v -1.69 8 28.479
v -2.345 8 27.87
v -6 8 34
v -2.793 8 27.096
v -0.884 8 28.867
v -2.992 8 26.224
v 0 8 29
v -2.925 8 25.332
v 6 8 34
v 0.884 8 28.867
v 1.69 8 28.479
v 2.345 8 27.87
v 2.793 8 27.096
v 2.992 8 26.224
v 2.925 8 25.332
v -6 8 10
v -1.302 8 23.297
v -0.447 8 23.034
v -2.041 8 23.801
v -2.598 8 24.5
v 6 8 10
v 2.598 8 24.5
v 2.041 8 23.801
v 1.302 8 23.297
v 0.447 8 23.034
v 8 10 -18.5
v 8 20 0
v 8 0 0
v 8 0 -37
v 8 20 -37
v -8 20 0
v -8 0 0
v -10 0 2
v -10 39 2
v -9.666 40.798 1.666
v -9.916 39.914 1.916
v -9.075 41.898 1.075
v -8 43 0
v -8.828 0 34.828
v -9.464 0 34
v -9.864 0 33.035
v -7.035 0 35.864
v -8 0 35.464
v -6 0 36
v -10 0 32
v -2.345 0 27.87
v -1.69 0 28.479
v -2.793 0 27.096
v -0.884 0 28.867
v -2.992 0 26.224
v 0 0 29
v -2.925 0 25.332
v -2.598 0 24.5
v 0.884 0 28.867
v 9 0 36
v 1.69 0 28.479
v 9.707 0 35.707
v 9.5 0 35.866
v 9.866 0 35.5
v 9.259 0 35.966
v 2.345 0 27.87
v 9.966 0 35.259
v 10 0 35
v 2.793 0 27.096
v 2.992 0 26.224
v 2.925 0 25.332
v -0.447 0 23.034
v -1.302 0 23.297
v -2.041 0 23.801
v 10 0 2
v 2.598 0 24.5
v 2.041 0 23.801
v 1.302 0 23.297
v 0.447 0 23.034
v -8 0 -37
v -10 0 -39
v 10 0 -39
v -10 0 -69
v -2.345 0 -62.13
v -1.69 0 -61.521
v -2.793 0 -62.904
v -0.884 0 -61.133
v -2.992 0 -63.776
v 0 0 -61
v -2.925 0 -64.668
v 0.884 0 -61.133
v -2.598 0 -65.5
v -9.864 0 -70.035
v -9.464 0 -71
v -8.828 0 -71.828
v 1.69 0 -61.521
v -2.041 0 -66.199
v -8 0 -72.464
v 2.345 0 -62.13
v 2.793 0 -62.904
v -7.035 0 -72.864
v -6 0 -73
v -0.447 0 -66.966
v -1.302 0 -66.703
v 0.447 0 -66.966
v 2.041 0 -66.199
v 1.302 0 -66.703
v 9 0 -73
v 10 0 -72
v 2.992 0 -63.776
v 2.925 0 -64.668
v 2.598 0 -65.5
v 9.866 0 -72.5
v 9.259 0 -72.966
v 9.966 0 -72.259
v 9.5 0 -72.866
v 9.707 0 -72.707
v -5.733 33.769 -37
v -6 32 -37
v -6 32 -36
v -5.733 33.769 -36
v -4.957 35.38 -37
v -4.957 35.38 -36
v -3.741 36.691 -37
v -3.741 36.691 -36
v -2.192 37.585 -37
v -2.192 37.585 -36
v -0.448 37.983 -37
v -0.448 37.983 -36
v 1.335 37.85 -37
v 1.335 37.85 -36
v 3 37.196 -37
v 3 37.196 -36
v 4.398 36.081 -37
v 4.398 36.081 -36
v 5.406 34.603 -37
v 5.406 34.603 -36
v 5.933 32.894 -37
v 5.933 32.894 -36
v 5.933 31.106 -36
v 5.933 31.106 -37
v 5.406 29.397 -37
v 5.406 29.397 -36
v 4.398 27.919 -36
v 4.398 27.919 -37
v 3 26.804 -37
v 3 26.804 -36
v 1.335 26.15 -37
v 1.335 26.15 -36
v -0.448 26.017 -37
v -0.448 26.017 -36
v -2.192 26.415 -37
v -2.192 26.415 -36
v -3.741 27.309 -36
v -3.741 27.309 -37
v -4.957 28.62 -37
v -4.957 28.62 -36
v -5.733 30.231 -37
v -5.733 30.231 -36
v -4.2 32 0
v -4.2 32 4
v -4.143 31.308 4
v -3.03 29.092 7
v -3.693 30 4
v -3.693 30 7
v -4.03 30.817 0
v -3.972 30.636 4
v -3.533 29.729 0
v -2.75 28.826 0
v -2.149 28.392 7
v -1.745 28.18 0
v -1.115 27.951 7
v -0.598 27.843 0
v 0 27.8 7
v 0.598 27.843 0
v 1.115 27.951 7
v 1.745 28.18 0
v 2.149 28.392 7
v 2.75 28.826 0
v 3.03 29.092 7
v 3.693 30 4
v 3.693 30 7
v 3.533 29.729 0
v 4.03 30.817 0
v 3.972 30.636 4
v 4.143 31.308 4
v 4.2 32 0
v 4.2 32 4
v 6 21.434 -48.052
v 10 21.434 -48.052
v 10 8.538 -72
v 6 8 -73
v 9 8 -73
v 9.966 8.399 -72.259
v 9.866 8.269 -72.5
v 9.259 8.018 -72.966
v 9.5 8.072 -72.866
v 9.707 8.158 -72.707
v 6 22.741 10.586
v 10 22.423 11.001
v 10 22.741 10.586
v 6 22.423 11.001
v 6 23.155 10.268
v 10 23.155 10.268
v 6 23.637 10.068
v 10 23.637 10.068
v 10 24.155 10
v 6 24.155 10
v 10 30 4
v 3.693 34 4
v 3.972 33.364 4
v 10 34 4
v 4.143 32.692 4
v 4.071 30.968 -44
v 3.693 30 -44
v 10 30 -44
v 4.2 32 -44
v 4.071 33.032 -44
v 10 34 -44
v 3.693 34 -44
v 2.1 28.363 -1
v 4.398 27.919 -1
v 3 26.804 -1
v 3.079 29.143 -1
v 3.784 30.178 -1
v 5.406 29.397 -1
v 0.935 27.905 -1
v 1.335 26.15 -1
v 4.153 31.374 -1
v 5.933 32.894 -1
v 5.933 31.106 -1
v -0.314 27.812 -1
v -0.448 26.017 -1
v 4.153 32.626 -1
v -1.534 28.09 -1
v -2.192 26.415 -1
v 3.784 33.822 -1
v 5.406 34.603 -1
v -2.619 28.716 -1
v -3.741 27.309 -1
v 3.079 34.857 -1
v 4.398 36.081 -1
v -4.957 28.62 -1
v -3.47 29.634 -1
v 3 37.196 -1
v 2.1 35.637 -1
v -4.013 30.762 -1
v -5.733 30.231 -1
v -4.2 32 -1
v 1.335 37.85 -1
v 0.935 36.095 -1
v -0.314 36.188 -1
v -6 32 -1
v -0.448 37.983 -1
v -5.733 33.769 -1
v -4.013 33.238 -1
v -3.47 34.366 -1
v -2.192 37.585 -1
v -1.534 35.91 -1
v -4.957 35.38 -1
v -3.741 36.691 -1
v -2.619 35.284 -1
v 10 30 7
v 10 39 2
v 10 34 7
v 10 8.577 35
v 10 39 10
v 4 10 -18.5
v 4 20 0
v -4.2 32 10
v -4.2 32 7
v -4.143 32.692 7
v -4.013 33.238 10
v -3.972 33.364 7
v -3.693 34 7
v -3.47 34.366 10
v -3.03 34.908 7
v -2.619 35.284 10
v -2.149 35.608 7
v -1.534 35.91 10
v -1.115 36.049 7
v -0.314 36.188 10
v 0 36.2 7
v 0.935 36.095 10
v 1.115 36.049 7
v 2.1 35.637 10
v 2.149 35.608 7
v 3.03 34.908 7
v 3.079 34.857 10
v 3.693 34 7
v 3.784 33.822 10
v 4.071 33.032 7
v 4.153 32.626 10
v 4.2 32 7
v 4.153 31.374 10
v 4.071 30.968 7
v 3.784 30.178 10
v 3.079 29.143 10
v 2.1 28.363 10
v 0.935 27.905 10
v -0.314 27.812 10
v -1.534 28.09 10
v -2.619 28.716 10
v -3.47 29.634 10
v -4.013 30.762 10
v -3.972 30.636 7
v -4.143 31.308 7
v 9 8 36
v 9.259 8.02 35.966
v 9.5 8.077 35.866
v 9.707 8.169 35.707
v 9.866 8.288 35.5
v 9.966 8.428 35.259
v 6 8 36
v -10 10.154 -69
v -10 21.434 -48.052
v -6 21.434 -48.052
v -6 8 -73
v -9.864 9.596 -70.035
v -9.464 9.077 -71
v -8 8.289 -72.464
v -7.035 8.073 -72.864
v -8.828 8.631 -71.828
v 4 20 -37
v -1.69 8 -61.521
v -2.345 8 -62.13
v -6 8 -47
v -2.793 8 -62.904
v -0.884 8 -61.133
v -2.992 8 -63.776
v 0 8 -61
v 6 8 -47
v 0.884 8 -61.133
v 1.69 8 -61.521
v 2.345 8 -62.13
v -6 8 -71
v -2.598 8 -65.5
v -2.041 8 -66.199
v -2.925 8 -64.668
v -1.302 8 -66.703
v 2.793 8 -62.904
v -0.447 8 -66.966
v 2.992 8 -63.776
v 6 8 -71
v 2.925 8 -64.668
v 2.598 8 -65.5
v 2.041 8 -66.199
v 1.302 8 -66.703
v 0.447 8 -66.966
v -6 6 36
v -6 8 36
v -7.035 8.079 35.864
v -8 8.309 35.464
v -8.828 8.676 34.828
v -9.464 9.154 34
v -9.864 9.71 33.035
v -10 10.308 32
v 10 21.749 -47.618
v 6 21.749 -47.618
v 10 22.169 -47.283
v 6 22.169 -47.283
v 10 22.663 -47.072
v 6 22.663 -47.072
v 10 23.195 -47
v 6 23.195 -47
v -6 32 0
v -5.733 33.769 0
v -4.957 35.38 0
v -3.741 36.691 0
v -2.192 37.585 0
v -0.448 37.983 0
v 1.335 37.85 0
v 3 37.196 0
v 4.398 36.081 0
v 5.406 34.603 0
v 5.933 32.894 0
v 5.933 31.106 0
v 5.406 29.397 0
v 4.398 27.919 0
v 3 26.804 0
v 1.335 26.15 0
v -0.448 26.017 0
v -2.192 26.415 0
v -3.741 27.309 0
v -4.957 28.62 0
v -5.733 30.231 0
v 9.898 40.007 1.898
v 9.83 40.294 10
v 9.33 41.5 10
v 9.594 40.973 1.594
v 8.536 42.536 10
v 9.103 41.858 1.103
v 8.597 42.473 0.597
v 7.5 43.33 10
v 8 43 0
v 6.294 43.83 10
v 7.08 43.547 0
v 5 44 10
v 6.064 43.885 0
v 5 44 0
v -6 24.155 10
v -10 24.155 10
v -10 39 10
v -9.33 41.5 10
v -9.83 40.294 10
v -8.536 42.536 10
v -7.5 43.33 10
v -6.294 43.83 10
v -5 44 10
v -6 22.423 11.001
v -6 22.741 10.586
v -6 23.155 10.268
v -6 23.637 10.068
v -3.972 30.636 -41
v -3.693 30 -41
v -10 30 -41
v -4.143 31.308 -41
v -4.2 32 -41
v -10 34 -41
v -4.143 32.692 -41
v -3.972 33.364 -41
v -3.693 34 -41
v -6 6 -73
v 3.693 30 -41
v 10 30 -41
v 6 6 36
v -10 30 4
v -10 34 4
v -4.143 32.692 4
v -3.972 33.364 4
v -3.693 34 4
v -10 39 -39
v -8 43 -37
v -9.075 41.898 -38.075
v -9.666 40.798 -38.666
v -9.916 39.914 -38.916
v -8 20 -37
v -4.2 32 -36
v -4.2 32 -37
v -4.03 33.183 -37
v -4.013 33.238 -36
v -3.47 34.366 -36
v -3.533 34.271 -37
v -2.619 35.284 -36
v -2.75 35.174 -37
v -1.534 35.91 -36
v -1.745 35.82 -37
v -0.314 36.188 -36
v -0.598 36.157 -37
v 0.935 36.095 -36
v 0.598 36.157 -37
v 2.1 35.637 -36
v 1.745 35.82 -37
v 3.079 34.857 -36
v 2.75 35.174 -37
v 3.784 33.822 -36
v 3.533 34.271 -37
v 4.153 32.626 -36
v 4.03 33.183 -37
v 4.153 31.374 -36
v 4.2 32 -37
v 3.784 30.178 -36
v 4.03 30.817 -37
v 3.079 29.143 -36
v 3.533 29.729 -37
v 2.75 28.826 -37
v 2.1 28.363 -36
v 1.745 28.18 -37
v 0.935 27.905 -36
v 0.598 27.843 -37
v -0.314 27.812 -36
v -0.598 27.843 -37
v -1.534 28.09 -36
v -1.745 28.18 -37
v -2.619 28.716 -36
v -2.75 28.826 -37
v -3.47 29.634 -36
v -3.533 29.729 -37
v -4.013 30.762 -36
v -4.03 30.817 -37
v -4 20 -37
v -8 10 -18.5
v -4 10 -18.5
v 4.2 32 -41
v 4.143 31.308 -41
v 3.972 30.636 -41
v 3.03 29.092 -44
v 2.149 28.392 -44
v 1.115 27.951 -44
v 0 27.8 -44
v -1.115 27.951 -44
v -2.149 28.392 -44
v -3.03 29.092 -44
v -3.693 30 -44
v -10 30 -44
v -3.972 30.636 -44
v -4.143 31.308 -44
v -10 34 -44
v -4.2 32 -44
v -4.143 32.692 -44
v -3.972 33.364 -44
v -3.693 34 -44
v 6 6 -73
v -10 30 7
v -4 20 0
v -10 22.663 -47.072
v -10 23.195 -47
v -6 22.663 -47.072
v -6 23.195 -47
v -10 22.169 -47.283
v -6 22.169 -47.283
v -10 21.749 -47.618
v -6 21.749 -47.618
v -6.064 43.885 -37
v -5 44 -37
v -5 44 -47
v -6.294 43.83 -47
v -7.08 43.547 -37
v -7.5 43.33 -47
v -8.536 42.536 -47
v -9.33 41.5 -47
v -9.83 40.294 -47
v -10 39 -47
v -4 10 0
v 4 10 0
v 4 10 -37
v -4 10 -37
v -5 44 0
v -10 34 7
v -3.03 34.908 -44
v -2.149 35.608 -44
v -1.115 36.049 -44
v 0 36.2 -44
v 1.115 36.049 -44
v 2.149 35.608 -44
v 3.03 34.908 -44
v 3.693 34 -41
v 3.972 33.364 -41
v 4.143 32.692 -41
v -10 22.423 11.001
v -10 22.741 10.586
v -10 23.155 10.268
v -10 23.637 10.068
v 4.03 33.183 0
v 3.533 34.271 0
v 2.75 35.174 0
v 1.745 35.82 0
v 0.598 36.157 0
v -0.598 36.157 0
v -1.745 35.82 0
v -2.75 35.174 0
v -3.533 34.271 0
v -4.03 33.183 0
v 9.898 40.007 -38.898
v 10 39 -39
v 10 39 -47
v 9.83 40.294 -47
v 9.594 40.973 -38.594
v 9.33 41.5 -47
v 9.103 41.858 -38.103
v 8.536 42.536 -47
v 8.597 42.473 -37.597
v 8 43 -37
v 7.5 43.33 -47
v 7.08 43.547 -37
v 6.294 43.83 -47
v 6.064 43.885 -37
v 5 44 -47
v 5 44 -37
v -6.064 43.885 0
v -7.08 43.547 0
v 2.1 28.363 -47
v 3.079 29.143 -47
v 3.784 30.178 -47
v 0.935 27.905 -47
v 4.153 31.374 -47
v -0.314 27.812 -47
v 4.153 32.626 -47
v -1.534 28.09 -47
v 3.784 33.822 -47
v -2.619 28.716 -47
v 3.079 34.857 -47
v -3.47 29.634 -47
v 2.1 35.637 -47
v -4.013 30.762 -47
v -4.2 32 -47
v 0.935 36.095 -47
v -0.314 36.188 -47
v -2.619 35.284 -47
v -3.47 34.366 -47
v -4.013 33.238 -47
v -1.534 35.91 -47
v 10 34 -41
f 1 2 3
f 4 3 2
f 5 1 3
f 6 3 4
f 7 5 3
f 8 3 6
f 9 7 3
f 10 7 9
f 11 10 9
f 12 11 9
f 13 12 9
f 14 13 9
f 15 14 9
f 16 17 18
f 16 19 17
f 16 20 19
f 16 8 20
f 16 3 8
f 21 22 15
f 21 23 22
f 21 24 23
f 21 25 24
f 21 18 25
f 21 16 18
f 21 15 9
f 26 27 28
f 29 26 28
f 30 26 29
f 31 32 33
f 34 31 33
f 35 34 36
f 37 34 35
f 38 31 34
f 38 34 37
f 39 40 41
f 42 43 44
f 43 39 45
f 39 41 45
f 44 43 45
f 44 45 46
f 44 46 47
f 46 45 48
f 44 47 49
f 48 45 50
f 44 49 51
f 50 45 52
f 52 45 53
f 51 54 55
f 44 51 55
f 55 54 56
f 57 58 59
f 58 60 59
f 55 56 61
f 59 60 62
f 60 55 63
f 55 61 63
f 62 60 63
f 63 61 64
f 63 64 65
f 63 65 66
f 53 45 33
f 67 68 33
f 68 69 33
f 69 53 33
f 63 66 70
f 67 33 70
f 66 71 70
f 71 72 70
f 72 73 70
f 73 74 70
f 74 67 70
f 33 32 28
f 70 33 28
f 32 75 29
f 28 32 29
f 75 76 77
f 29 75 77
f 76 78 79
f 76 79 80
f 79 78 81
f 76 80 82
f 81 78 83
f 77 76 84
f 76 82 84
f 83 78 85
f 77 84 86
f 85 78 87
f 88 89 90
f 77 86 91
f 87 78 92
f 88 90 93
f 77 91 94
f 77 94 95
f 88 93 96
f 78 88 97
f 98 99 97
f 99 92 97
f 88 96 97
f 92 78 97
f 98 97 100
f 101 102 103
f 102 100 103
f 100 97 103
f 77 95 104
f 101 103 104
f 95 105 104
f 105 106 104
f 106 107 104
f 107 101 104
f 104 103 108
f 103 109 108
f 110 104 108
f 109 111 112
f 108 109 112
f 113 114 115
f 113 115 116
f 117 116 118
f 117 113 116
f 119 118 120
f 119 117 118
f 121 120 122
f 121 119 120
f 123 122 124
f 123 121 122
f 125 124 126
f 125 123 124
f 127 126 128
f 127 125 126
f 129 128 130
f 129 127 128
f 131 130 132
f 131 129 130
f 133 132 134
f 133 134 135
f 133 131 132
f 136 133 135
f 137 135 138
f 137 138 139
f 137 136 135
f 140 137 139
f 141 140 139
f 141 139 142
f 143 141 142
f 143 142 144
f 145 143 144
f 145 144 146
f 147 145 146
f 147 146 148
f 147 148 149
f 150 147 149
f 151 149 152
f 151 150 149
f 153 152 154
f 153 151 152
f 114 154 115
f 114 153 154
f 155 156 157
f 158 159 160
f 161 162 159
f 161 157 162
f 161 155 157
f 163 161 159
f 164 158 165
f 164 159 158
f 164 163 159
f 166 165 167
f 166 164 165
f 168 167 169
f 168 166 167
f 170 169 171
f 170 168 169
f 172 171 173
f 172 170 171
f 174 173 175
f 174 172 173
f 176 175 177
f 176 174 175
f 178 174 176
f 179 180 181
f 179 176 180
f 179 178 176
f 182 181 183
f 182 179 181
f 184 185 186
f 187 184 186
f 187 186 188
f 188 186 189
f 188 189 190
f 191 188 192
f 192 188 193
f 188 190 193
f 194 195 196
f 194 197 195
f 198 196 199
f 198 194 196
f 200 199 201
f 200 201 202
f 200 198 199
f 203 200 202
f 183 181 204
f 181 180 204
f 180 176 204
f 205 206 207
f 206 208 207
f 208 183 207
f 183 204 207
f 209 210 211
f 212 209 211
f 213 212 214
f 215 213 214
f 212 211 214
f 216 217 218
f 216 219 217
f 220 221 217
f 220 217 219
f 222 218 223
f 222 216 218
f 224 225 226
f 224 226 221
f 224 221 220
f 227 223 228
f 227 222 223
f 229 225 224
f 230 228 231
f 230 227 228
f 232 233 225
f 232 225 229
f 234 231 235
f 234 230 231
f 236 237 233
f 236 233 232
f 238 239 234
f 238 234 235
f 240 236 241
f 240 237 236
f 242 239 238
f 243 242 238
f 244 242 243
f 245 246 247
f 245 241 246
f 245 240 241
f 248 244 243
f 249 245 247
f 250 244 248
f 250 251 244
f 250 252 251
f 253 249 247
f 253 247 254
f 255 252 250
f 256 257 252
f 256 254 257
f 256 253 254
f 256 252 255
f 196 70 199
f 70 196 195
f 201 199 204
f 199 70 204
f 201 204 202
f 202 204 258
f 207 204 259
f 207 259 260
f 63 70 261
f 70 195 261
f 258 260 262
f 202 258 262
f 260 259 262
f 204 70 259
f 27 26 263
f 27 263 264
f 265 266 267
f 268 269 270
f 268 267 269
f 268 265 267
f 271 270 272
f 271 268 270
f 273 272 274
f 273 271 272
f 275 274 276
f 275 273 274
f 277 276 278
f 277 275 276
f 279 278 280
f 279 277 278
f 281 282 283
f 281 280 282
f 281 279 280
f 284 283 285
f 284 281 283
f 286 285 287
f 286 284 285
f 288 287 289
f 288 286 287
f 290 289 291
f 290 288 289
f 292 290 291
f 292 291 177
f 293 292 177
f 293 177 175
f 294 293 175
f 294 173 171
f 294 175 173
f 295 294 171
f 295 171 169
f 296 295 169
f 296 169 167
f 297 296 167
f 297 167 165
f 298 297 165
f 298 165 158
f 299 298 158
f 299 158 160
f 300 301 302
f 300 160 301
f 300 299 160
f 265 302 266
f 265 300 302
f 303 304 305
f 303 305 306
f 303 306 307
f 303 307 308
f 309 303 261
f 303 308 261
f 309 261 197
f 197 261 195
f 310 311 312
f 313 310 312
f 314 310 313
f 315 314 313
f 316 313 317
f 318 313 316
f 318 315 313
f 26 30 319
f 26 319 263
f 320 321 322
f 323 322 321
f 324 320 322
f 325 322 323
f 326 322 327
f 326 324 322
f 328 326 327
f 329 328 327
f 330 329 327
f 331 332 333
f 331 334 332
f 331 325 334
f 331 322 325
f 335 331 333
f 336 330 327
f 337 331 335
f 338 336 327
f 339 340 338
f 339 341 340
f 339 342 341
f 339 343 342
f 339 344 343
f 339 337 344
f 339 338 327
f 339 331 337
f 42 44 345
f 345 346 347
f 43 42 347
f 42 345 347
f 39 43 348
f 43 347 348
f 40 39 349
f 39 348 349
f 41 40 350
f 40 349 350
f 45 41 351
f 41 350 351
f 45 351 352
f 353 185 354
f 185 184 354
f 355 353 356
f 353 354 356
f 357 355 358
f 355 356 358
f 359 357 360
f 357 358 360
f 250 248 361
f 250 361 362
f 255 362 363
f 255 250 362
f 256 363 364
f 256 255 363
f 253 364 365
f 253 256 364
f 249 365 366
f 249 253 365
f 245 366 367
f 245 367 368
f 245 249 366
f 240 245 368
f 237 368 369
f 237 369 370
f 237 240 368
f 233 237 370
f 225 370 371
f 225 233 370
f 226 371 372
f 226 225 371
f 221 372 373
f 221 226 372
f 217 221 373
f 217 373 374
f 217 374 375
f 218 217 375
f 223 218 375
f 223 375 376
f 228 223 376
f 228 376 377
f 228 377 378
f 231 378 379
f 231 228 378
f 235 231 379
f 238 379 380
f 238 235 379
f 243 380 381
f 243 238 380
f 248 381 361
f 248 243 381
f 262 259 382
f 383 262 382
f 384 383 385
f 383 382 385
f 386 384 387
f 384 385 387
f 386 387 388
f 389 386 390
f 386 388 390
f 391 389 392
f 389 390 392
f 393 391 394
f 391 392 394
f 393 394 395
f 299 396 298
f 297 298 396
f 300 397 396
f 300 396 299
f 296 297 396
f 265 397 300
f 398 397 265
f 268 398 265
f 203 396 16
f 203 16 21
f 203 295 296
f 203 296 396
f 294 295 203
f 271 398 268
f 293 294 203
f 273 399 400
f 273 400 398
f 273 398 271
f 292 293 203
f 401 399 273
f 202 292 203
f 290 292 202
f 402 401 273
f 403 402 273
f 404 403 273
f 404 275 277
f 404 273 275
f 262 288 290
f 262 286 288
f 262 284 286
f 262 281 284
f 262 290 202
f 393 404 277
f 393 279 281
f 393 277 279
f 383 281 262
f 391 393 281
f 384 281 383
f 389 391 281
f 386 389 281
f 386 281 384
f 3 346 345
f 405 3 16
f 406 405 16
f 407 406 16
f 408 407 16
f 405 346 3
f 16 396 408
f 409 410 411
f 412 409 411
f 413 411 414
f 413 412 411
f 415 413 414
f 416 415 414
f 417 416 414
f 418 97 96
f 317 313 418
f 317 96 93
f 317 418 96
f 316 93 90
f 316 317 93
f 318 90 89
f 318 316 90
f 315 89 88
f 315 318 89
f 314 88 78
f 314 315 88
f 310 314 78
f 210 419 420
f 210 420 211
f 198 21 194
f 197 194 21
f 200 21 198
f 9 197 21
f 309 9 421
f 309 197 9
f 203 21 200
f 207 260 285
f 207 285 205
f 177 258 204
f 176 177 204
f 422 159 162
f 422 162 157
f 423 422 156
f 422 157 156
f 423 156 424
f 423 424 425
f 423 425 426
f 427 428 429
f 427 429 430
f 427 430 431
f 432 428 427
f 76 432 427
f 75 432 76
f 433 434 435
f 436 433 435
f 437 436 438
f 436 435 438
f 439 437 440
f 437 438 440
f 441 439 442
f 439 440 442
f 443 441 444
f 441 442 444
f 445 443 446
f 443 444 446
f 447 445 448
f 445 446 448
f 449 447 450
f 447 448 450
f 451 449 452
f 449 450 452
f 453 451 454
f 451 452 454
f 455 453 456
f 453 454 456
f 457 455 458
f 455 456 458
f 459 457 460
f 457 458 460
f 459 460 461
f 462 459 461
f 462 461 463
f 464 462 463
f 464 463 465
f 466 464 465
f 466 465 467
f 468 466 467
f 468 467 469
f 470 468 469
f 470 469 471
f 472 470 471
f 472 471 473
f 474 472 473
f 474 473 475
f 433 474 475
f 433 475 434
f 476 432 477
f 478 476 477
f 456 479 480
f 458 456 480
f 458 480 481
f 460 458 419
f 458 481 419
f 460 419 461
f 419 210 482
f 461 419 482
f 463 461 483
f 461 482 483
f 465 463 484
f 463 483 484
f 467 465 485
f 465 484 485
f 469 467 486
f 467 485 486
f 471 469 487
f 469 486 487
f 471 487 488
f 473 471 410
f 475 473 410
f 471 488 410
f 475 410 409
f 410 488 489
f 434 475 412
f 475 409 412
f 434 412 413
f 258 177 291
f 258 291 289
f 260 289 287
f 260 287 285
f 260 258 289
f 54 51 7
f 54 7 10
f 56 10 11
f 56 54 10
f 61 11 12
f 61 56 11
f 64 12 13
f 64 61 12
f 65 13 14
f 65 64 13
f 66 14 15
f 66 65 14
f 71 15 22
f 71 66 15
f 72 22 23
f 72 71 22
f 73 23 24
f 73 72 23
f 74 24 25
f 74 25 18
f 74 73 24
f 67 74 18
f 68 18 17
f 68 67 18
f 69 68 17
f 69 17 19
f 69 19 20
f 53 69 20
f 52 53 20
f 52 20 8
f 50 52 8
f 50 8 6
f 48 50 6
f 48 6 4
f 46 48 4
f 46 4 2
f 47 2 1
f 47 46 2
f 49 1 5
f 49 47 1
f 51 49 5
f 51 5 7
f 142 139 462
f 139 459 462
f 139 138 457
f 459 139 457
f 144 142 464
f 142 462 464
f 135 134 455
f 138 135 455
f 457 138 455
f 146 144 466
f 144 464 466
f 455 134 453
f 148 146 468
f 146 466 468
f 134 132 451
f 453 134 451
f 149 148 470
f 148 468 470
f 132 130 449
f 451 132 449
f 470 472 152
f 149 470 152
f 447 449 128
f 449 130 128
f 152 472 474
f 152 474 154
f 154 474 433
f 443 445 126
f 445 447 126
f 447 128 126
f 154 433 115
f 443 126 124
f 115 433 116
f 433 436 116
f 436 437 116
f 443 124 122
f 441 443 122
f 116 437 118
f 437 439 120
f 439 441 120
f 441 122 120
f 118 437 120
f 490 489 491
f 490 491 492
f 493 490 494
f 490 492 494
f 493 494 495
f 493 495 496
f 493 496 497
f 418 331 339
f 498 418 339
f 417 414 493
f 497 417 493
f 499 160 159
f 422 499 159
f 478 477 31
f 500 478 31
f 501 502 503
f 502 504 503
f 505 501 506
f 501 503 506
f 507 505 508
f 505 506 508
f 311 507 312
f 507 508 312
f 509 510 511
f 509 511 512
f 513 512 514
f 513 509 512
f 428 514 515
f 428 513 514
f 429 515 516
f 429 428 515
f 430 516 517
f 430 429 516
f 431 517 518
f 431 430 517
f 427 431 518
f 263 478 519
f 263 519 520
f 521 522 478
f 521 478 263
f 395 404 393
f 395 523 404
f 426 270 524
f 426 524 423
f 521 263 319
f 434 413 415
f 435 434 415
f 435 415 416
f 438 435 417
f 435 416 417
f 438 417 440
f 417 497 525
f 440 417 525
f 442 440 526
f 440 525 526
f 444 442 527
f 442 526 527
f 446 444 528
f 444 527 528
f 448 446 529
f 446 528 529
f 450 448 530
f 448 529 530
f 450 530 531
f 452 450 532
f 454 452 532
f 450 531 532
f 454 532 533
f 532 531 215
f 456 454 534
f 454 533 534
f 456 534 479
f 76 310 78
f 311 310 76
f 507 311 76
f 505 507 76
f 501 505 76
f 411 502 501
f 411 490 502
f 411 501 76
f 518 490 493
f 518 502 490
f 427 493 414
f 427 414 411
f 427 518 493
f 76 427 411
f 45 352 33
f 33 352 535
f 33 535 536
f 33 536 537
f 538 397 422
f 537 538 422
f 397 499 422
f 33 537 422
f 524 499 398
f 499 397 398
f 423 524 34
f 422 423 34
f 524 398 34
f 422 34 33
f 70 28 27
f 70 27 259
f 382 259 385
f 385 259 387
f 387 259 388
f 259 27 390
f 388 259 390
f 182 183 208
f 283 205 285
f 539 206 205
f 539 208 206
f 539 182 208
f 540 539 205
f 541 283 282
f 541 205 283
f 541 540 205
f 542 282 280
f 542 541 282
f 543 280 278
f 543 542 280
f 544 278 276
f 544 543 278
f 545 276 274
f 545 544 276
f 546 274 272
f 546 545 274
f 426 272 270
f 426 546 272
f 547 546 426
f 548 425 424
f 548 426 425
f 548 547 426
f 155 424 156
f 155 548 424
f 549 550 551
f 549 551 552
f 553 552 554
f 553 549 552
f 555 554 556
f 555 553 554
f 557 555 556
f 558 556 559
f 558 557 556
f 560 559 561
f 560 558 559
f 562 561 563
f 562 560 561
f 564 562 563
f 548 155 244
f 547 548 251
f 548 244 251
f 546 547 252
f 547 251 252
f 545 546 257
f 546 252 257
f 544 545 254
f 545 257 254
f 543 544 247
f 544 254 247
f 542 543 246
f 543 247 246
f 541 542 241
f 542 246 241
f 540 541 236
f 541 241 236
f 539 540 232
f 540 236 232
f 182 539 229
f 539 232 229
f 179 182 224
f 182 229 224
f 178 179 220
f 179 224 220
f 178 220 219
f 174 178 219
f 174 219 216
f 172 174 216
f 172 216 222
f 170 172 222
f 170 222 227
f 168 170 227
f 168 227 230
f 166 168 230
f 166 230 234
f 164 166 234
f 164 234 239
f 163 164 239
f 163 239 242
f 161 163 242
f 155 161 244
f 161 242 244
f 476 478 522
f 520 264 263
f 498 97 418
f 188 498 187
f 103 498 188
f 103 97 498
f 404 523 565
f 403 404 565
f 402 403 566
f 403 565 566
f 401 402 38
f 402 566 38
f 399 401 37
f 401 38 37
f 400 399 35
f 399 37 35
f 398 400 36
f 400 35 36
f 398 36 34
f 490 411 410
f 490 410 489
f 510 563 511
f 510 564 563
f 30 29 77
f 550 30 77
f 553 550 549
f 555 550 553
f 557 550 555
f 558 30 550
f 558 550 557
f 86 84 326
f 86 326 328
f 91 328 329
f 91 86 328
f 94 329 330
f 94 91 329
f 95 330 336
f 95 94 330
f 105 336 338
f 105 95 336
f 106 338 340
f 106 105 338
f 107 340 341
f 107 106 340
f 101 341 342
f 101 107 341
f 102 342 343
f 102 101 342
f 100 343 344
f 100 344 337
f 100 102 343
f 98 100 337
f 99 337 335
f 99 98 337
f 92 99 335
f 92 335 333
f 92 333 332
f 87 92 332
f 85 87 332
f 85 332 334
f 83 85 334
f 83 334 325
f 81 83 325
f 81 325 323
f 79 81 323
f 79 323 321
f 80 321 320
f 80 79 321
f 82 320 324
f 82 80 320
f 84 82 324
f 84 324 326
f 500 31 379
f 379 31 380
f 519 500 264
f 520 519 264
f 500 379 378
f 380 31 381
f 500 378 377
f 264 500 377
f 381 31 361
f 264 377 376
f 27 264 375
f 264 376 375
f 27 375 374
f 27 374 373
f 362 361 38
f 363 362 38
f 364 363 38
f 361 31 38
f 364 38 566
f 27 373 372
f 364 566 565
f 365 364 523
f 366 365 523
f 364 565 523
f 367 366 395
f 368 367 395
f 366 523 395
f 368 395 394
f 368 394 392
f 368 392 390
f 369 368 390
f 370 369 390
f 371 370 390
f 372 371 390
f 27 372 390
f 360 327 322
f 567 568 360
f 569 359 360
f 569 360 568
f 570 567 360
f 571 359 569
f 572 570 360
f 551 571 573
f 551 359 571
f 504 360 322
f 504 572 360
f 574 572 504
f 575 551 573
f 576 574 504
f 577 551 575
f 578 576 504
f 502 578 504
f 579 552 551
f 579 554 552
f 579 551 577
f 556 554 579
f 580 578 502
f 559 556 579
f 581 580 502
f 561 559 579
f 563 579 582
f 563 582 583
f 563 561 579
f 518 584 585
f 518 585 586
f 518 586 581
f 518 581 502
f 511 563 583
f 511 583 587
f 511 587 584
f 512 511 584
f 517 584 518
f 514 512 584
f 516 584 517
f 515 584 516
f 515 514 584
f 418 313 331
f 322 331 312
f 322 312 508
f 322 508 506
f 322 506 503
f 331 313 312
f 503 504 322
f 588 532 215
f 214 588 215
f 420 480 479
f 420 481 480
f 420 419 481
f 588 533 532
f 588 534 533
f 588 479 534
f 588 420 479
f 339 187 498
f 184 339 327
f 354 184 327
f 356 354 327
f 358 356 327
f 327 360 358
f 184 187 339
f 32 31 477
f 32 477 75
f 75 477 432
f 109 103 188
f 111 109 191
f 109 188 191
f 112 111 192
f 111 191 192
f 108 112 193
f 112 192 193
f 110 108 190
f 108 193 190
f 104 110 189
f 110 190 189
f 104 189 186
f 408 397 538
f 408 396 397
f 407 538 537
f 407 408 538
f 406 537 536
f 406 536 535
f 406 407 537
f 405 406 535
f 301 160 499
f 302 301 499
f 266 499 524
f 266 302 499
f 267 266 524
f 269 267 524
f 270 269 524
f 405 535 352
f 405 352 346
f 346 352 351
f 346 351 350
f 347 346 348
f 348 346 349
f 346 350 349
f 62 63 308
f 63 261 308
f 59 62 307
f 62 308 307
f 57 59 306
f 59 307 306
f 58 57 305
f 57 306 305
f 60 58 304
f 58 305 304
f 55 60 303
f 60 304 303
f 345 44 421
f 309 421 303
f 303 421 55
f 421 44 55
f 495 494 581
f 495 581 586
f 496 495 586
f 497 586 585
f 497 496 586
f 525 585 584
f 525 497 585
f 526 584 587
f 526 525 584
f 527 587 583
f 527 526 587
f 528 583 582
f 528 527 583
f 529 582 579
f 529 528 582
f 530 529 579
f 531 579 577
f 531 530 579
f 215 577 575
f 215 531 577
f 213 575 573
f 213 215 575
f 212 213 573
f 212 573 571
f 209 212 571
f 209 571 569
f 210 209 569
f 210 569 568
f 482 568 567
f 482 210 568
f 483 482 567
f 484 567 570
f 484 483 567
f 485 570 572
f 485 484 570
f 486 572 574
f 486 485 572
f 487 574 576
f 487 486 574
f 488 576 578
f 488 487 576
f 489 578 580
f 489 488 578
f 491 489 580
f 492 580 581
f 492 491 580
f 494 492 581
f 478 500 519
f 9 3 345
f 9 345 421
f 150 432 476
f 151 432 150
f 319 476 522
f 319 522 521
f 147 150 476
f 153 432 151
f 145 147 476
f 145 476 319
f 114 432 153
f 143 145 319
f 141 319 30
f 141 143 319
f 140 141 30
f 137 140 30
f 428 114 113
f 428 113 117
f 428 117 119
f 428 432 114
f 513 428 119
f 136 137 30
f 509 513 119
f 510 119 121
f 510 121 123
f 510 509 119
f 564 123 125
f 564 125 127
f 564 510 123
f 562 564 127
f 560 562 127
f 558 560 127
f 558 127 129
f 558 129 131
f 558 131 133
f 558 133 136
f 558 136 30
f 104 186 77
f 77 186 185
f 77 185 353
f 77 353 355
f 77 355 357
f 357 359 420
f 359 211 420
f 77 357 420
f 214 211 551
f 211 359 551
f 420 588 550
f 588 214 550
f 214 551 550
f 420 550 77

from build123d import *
from build123d.topology import SkipClean

# Parameters (mm, degrees)
SKETCH_1_W               = 20
SKETCH_1_H               = 44
SKETCH_1_R               = 4.2
EXTRUDE_1_DEPTH          = 7
SKETCH_2_W               = 20
SKETCH_2_H               = 44
EXTRUDE_2_DEPTH          = 3
SKETCH_3_W               = 20
SKETCH_3_H               = 26
SKETCH_3_R               = 3
EXTRUDE_4_DEPTH          = 8
EXTRUDE_5_DEPTH          = 4
EXTRUDE_6_DEPTH          = 4
CHAMFER_1_SIZE           = 2
FILLET_2_R               = 5
FILLET_3_R               = 1
FILLET_4_R               = 2
SKETCH_6_W               = 16
SKETCH_6_H               = 37
EXTRUDE_7_DEPTH          = 10
EXTRUDE_START            = 7
SKETCH_7_R               = 4.2
EXTRUDE_8_DEPTH          = 7
CHAMFER_2_SIZE           = 2
SKETCH_8_W               = 20
SKETCH_8_H               = 44
EXTRUDE_9_DEPTH          = 3
SKETCH_9_W               = 20
SKETCH_9_H               = 26
SKETCH_9_R               = 3
EXTRUDE_10_DEPTH         = 8
EXTRUDE_11_DEPTH         = 4
EXTRUDE_12_DEPTH         = 4
FILLET_5_R               = 2
FILLET_7_R               = 1
FILLET_8_R               = 5
SKETCH_12_W              = 3
SKETCH_12_H              = 4
CUT_EXTRUDE_1_DEPTH      = 88.549985722
EXTRUDE_13_DEPTH         = 4
EXTRUDE_14_DEPTH         = 4
CUT_EXTRUDE_2_DEPTH      = 86.819578186
CUT_EXTRUDE_2_DEPTH_BACK = 86.819578186
SKETCH_15_R              = 4.2
SKETCH_16_R              = 6
SKETCH_16_R_2            = 4.2
EXTRUDE_15_DEPTH         = 1
EXTRUDE_START_2          = 1
SKETCH_17_R              = 6
SKETCH_17_R_2            = 4.2
EXTRUDE_16_DEPTH         = 1
CHAMFER_3_SIZE           = 2
FILLET_9_R               = 4


with BuildPart() as part:
    # Эскиз1 → Бобышка-Вытянуть1 (new body)
    with BuildSketch(Plane.XY):
        with Locations((0, 22)):
            Rectangle(SKETCH_1_W, SKETCH_1_H)
        with Locations((0, 32)):
            Circle(SKETCH_1_R, mode=Mode.SUBTRACT)
    extrude(amount=EXTRUDE_1_DEPTH)

    # Эскиз2 → Бобышка-Вытянуть2 (add)
    with BuildSketch(Plane.XY.offset(7)):
        with Locations((0, 22)):
            Rectangle(SKETCH_2_W, SKETCH_2_H)
    extrude(amount=EXTRUDE_2_DEPTH)

    # Эскиз3 → Бобышка-Вытянуть4 (add)
    with BuildSketch(Plane(origin=(0, 0, 0), x_dir=(1, 0, 0), z_dir=(0, 1, 0))):
        with Locations((0, -23)):
            Rectangle(SKETCH_3_W, SKETCH_3_H)
        with Locations(Location((0, -26, 0), (0, 0, 270))):
            Circle(SKETCH_3_R, mode=Mode.SUBTRACT)
    extrude(amount=EXTRUDE_4_DEPTH)

    # Эскиз4 → Бобышка-Вытянуть5 (add)
    with BuildSketch(Plane.ZY.offset(10)):
        Polygon((36, 8), (10, 8), (10, 23), align=None)
    extrude(amount=-EXTRUDE_5_DEPTH)

    # Эскиз5 → Бобышка-Вытянуть6 (add)
    with BuildSketch(Plane(origin=(10, 0, 0), x_dir=(0, 0, -1), z_dir=(1, 0, 0))):
        Polygon((-36, 8), (-10, 23), (-10, 8), align=None)
    extrude(amount=-EXTRUDE_6_DEPTH)

    # Фаска1
    chamfer_1_edges = [part.edges().sort_by_distance(p)[0] for p in [
        (10, 22, 0),
        (-10, 22, 0),
    ]]
    chamfer(chamfer_1_edges, length=CHAMFER_1_SIZE)

    # Скругление2
    fillet_2_edges = [part.edges().sort_by_distance(p)[0] for p in [
        (-10, 44, 6),
        (10, 44, 6),
    ]]
    fillet(fillet_2_edges, radius=FILLET_2_R)

    # Скругление3
    fillet_3_edges = [part.edges().sort_by_distance(p)[0] for p in [
        (10, 4, 36),
    ]]
    fillet(fillet_3_edges, radius=FILLET_3_R)

    # Скругление4
    fillet_4_edges = [part.edges().sort_by_distance(p)[0] for p in [
        (-8, 23, 10),
        (8, 23, 10),
    ]]
    fillet(fillet_4_edges, radius=FILLET_4_R)

    # Эскиз6 → Бобышка-Вытянуть7 (add)
    with BuildSketch(Plane(origin=(0, 0, 0), x_dir=(1, 0, 0), z_dir=(0, 1, 0))):
        with Locations((0, 18.5)):
            Rectangle(SKETCH_6_W, SKETCH_6_H)
    extrude(amount=EXTRUDE_7_DEPTH)

    # Эскиз7 → Бобышка-Вытянуть8 (add)
    with BuildSketch(Plane(origin=(0, 0, -37), x_dir=(-1, 0, 0), z_dir=(0, 0, -1)).offset(EXTRUDE_START)):
        Polygon((0, 0), (-10, 0), (-10, 44), (10, 44), (10, 0), align=None)
        with Locations(Location((0, 32, 0), (0, 0, 180))):
            Circle(SKETCH_7_R, mode=Mode.SUBTRACT)
    extrude(amount=-EXTRUDE_8_DEPTH)

    # Фаска2
    chamfer_2_edges = [part.edges().sort_by_distance(p)[0] for p in [
        (10, 22, -37),
        (-10, 22, -37),
    ]]
    chamfer(chamfer_2_edges, length=CHAMFER_2_SIZE)

    # Эскиз8 → Бобышка-Вытянуть9 (add)
    with BuildSketch(Plane(origin=(0, 0, -44), x_dir=(-1, 0, 0), z_dir=(0, 0, -1))):
        with Locations((0, 22)):
            Rectangle(SKETCH_8_W, SKETCH_8_H)
    extrude(amount=EXTRUDE_9_DEPTH)

    # Эскиз9 → Бобышка-Вытянуть10 (add)
    with BuildSketch(Plane(origin=(0, 0, 0), x_dir=(1, 0, 0), z_dir=(0, 1, 0))):
        with Locations((0, 60)):
            Rectangle(SKETCH_9_W, SKETCH_9_H)
        with Locations(Location((0, 64, 0), (0, 0, 270))):
            Circle(SKETCH_9_R, mode=Mode.SUBTRACT)
    extrude(amount=EXTRUDE_10_DEPTH)

    # Эскиз10 → Бобышка-Вытянуть11 (add)
    with BuildSketch(Plane.ZY.offset(10)):
        Polygon((-73, 8), (-47, 8), (-47, 22), align=None)
    extrude(amount=-EXTRUDE_11_DEPTH)

    # Эскиз11 → Бобышка-Вытянуть12 (add)
    with BuildSketch(Plane(origin=(10, 0, 0), x_dir=(0, 0, -1), z_dir=(1, 0, 0))):
        Polygon((47, 8), (47, 22), (73, 8), align=None)
    extrude(amount=-EXTRUDE_12_DEPTH)

    # Скругление5
    fillet_5_edges = [part.edges().sort_by_distance(p)[0] for p in [
        (-8, 22, -47),
        (8, 22, -47),
    ]]
    fillet(fillet_5_edges, radius=FILLET_5_R)

    # Скругление7
    fillet_7_edges = [part.edges().sort_by_distance(p)[0] for p in [
        (10, 4, -73),
    ]]
    fillet(fillet_7_edges, radius=FILLET_7_R)

    # Скругление8
    fillet_8_edges = [part.edges().sort_by_distance(p)[0] for p in [
        (-10, 44, -43),
        (10, 44, -43),
    ]]
    fillet(fillet_8_edges, radius=FILLET_8_R)

    # Эскиз12 → Вырез-Вытянуть1 (cut, through all)
    with BuildSketch(Plane(origin=(10, 0, 0), x_dir=(0, 0, -1), z_dir=(1, 0, 0))):
        with Locations((-5.5, 32)):
            Rectangle(SKETCH_12_W, SKETCH_12_H)
        with Locations((42.5, 32)):
            Rectangle(SKETCH_12_W, SKETCH_12_H)
    extrude(amount=-CUT_EXTRUDE_1_DEPTH, mode=Mode.SUBTRACT)

    # Эскиз13 → Бобышка-Вытянуть13 (add)
    with BuildSketch(Plane(origin=(8, 0, 0), x_dir=(0, 0, -1), z_dir=(1, 0, 0))):
        Polygon((0, 10), (18.5, 10), (0, 20), align=None)
        Polygon((37, 10), (37, 20), (18.5, 10), align=None)
    extrude(amount=-EXTRUDE_13_DEPTH)

    # Эскиз14 → Бобышка-Вытянуть14 (add)
    with BuildSketch(Plane.ZY.offset(8)):
        Polygon((0, 10), (-18.5, 10), (0, 20), align=None)
        Polygon((-37, 10), (-37, 20), (-18.5, 10), align=None)
    extrude(amount=-EXTRUDE_14_DEPTH)

    # Эскиз15 → Вырез-Вытянуть2 (cut, two sides: drawn at the far end of the back side and taken through both)
    with SkipClean():  # the faces are left unmerged after this step: merging them gives an invalid solid
        with BuildSketch(Plane(origin=(0, 0, -37), x_dir=(-1, 0, 0), z_dir=(0, 0, -1)).offset(-CUT_EXTRUDE_2_DEPTH_BACK)):
            with Locations((0, 32)):
                Circle(SKETCH_15_R)
        extrude(amount=CUT_EXTRUDE_2_DEPTH + CUT_EXTRUDE_2_DEPTH_BACK, mode=Mode.SUBTRACT)

    # Эскиз16 → Бобышка-Вытянуть15 (add)
    with SkipClean():  # the faces are left unmerged after this step: merging them gives an invalid solid
        with BuildSketch(Plane(origin=(0, 0, -37), x_dir=(-1, 0, 0), z_dir=(0, 0, -1))):
            with Locations((0, 32)):
                Circle(SKETCH_16_R)
            with Locations((0, 32)):
                Circle(SKETCH_16_R_2, mode=Mode.SUBTRACT)
        extrude(amount=-EXTRUDE_15_DEPTH)

    # Эскиз17 → Бобышка-Вытянуть16 (add)
    with SkipClean():  # the faces are left unmerged after this step: merging them gives an invalid solid
        with BuildSketch(Plane(origin=(0, 0, 0), x_dir=(-1, 0, 0), z_dir=(0, 0, -1)).offset(EXTRUDE_START_2)):
            with Locations((0, 32)):
                Circle(SKETCH_17_R)
            with Locations((0, 32)):
                Circle(SKETCH_17_R_2, mode=Mode.SUBTRACT)
        extrude(amount=-EXTRUDE_16_DEPTH)

    # Фаска3
    chamfer_3_edges = [part.edges().sort_by_distance(p)[0] for p in [
        (0, 8, -73),
        (0, 8, 36),
    ]]
    chamfer(chamfer_3_edges, length=CHAMFER_3_SIZE)

    # Скругление9
    fillet_9_edges = [part.edges().sort_by_distance(p)[0] for p in [
        (-10, 4, 36),
        (-10, 4, -73),
    ]]
    fillet(fillet_9_edges, radius=FILLET_9_R)


solid = part.part
